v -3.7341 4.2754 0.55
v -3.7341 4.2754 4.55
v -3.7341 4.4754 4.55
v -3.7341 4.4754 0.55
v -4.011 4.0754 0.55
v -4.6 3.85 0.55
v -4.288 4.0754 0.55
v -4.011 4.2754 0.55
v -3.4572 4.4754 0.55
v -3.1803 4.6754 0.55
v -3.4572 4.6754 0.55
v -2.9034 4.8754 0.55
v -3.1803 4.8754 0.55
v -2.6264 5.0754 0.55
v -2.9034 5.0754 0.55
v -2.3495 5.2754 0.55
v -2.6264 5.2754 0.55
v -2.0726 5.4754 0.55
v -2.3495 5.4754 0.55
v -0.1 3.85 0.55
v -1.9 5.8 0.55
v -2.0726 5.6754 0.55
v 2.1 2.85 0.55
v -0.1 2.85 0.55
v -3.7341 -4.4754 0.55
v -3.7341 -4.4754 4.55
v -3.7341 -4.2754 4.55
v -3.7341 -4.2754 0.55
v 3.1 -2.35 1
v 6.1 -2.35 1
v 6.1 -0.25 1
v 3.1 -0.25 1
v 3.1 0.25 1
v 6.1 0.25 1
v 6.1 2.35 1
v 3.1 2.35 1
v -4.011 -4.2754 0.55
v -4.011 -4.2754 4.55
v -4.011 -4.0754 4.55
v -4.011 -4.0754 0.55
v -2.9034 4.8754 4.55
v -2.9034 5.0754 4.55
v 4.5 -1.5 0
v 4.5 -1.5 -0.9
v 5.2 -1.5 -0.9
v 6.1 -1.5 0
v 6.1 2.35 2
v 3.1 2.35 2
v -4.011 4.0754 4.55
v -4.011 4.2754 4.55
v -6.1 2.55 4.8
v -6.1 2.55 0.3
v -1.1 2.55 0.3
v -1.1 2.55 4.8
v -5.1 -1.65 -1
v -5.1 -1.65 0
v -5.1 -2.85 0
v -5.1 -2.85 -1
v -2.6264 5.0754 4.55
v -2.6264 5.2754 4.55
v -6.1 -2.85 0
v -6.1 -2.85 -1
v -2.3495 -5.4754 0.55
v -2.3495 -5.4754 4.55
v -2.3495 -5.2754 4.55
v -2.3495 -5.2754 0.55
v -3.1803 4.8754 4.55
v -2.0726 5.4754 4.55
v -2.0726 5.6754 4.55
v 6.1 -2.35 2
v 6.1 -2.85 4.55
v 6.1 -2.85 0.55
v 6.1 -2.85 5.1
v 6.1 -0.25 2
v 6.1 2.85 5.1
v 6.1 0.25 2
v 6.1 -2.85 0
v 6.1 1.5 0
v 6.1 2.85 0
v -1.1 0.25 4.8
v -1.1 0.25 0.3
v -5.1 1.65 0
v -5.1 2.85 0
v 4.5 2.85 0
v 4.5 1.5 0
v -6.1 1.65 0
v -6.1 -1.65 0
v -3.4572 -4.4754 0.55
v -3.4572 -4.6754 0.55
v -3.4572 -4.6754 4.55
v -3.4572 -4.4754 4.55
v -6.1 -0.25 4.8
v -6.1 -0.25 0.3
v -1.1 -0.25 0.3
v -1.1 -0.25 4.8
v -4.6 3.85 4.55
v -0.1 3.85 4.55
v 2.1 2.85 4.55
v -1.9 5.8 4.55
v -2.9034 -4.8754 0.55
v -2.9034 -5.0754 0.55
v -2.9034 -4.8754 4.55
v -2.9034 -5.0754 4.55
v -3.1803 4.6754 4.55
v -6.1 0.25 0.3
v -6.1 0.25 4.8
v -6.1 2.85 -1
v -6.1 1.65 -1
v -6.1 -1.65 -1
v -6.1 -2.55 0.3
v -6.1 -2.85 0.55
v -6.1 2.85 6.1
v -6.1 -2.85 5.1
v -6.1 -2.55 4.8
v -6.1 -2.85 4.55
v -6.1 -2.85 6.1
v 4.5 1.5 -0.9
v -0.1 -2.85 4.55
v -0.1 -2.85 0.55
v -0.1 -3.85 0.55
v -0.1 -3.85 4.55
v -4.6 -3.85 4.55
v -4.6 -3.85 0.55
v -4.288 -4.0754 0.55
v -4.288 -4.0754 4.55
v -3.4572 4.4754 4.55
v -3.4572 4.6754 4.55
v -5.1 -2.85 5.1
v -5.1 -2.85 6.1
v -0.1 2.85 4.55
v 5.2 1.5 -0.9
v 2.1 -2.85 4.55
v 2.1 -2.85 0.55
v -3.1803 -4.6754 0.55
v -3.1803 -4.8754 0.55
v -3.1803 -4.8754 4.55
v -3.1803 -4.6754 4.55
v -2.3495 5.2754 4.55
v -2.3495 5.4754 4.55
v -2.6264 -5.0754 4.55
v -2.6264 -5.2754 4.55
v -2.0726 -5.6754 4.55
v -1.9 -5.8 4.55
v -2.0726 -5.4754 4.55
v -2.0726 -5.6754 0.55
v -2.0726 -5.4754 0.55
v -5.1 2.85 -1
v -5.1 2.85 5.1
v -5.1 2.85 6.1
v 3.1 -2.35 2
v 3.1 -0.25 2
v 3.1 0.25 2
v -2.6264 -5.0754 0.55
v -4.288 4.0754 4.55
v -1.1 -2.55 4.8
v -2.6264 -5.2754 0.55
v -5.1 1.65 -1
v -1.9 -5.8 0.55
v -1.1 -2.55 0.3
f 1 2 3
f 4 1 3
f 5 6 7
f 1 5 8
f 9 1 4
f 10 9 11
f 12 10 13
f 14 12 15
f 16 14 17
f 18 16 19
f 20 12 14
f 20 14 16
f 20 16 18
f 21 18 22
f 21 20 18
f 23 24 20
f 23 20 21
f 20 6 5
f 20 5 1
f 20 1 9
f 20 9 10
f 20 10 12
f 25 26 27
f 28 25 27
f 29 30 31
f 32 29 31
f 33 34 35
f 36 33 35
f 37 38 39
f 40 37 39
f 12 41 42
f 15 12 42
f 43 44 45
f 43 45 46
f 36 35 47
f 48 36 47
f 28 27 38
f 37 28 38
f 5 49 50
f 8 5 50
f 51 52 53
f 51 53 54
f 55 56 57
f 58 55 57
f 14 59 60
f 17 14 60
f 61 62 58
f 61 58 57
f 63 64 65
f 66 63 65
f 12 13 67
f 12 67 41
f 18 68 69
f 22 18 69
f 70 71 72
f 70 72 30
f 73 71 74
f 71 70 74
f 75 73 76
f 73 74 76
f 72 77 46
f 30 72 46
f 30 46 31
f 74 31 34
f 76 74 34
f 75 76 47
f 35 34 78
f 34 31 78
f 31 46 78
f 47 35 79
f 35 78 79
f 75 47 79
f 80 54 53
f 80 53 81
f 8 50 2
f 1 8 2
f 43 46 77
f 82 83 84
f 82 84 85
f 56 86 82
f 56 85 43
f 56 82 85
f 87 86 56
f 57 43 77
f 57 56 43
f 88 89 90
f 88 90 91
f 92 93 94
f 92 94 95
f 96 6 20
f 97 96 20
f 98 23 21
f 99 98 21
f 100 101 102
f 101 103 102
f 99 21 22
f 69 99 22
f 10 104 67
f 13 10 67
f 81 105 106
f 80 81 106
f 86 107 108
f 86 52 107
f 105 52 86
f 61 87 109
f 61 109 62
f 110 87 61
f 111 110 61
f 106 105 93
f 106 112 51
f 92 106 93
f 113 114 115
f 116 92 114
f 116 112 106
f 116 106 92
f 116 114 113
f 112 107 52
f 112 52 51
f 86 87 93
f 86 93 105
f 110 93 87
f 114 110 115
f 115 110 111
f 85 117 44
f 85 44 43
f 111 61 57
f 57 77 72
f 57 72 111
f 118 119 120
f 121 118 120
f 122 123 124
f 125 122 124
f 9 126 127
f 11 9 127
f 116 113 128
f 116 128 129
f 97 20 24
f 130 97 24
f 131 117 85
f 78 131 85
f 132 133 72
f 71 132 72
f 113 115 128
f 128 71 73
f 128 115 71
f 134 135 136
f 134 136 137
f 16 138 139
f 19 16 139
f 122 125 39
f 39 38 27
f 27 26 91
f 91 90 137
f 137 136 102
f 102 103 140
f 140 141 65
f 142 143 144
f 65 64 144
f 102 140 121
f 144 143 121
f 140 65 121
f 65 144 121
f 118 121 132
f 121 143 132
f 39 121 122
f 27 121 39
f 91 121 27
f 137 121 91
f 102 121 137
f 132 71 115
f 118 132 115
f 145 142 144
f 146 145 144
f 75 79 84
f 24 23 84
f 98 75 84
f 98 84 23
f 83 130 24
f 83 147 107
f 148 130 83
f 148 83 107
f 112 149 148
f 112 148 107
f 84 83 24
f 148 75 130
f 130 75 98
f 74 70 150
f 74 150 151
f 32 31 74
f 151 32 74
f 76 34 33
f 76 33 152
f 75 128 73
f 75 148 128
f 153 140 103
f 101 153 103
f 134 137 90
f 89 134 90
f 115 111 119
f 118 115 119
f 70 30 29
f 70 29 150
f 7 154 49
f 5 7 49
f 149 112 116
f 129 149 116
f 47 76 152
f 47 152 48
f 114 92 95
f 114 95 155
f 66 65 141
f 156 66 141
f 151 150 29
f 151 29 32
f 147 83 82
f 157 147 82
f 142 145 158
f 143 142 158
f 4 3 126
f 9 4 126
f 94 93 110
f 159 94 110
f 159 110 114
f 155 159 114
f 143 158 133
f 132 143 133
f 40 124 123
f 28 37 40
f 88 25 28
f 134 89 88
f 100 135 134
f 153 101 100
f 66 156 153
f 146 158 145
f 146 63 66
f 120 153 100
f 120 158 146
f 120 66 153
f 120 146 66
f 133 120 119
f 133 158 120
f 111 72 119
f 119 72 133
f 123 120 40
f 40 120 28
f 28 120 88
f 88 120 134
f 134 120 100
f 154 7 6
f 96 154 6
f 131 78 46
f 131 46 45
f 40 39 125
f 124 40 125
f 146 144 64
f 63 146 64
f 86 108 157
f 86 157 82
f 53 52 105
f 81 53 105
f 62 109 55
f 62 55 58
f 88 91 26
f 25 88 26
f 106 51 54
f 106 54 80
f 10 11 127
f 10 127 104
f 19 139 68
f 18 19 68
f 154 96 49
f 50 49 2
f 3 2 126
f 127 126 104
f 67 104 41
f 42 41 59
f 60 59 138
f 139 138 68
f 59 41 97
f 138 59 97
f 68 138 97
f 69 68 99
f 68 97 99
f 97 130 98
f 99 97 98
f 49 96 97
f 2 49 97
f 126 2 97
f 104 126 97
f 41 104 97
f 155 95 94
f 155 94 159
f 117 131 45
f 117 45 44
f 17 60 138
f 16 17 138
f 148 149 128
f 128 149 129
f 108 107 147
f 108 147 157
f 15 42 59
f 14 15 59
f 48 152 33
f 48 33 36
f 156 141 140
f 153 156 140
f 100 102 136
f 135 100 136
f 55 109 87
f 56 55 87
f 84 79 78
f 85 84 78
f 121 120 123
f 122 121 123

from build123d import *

# Parameters (mm, degrees)
F1_DEPTH  = 5.1
F2_W      = 3.345763
F2_H      = 0.55
F2_W_2    = 3.297828
F3_DEPTH  = 15
F5_DEPTH  = 25
F6_DEPTH  = 10
F7_W      = 5.7
F7_H      = 1
F7_W_2    = 1.2
F8_DEPTH  = 1
F11_DEPTH = 5.7
F12_W     = 1.586434
F12_H     = 1.404738
F12_W_2   = 1.617856
F12_H_2   = 1.427827
F13_DEPTH = 3
F14_W     = 2.1
F14_H     = 1
F15_DEPTH = 3
F16_W     = 2.3
F16_H     = 4.5
F17_DEPTH = 5


with BuildPart() as f1:
    # F0 (on Top) → F1 (new body)
    with BuildSketch(Plane.XY):
        Polygon((-0.1, 2.85), (-6.1, 2.85), (-6.1, -2.85), (-0.1, -2.85), (-0.1, -3.85), (-4.6, -3.85), (-1.9, -5.8), (2.1, -2.85), (6.1, -2.85), (6.1, 2.85), (2.1, 2.85), (-1.9, 5.8), (-4.6, 3.85), (-0.1, 3.85), align=None)
    extrude(amount=F1_DEPTH)

    # F2 (on face) → F3 (cut)
    with BuildSketch(Plane.YZ.offset(6.1)):
        with Locations((-4.522881, 4.825)):
            Rectangle(F2_W, F2_H)
        with Locations((-4.522881, 0.275)):
            Rectangle(F2_W, F2_H)
        with Locations((4.498914, 4.825)):
            Rectangle(F2_W_2, F2_H)
        with Locations((4.498914, 0.275)):
            Rectangle(F2_W_2, F2_H)
    extrude(amount=-F3_DEPTH, mode=Mode.SUBTRACT)

    # F4 (on face) → F5 (cut)
    with BuildSketch(Plane.XY.offset(4.55)):
        Polygon((-4.011046, 4.075356), (-4.011046, 4.275356), (-4.287969, 4.075356), align=None)
        Polygon((-3.734123, 4.275356), (-3.734123, 4.475356), (-4.011046, 4.275356), align=None)
        Polygon((-3.4572, 4.475356), (-3.4572, 4.675356), (-3.734123, 4.475356), align=None)
        Polygon((-3.180277, 4.675356), (-3.180277, 4.875356), (-3.4572, 4.675356), align=None)
        Polygon((-2.903354, 4.875356), (-2.903354, 5.075356), (-3.180277, 4.875356), align=None)
        Polygon((-2.626431, 5.075356), (-2.626431, 5.275356), (-2.903354, 5.075356), align=None)
        Polygon((-2.349508, 5.275356), (-2.349508, 5.475356), (-2.626431, 5.275356), align=None)
        Polygon((-2.349508, 5.475356), (-2.072585, 5.475356), (-2.072585, 5.675356), align=None)
        Polygon((-3.734123, -4.475356), (-3.4572, -4.675356), (-3.4572, -4.475356), align=None)
        Polygon((-2.072585, -5.475356), (-2.349508, -5.475356), (-2.072585, -5.675356), align=None)
        Polygon((-2.349508, -5.275356), (-2.626431, -5.275356), (-2.349508, -5.475356), align=None)
        Polygon((-2.626431, -5.075356), (-2.903354, -5.075356), (-2.626431, -5.275356), align=None)
        Polygon((-2.903354, -4.875356), (-3.180277, -4.875356), (-2.903354, -5.075356), align=None)
        Polygon((-3.180277, -4.675356), (-3.4572, -4.675356), (-3.180277, -4.875356), align=None)
        Polygon((-4.287969, -4.075356), (-4.011046, -4.275356), (-4.011046, -4.075356), align=None)
        Polygon((-4.011046, -4.275356), (-3.734123, -4.475356), (-3.734123, -4.275356), align=None)
    extrude(amount=-F5_DEPTH, mode=Mode.SUBTRACT)

    # F4 (on face) → F6 (cut)
    with BuildSketch(Plane.XY.offset(4.55)):
        Polygon((-4.011046, 4.075356), (-4.011046, 4.275356), (-4.287969, 4.075356), align=None)
        Polygon((-3.734123, 4.275356), (-3.734123, 4.475356), (-4.011046, 4.275356), align=None)
        Polygon((-3.4572, 4.475356), (-3.4572, 4.675356), (-3.734123, 4.475356), align=None)
        Polygon((-3.180277, 4.675356), (-3.180277, 4.875356), (-3.4572, 4.675356), align=None)
        Polygon((-2.903354, 4.875356), (-2.903354, 5.075356), (-3.180277, 4.875356), align=None)
        Polygon((-2.626431, 5.075356), (-2.626431, 5.275356), (-2.903354, 5.075356), align=None)
        Polygon((-2.349508, 5.275356), (-2.349508, 5.475356), (-2.626431, 5.275356), align=None)
        Polygon((-2.349508, 5.475356), (-2.072585, 5.475356), (-2.072585, 5.675356), align=None)
        Polygon((-3.734123, -4.475356), (-3.4572, -4.675356), (-3.4572, -4.475356), align=None)
        Polygon((-2.072585, -5.475356), (-2.349508, -5.475356), (-2.072585, -5.675356), align=None)
        Polygon((-2.349508, -5.275356), (-2.626431, -5.275356), (-2.349508, -5.475356), align=None)
        Polygon((-2.626431, -5.075356), (-2.903354, -5.075356), (-2.626431, -5.275356), align=None)
        Polygon((-2.903354, -4.875356), (-3.180277, -4.875356), (-2.903354, -5.075356), align=None)
        Polygon((-3.180277, -4.675356), (-3.4572, -4.675356), (-3.180277, -4.875356), align=None)
        Polygon((-4.287969, -4.075356), (-4.011046, -4.275356), (-4.011046, -4.075356), align=None)
        Polygon((-4.011046, -4.275356), (-3.734123, -4.475356), (-3.734123, -4.275356), align=None)
    extrude(amount=-F6_DEPTH, mode=Mode.SUBTRACT)


with BuildPart() as f8:
    # F7 (on face) → F8 (new body)
    with BuildSketch(Plane(origin=(-6.1, 0, 0), x_dir=(0, -1, 0), z_dir=(-1, 0, 0))):
        with Locations((0, 5.6)):
            Rectangle(F7_W, F7_H)
        with Locations((-2.25, -0.5)):
            Rectangle(F7_W_2, F7_H)
        with Locations((2.25, -0.5)):
            Rectangle(F7_W_2, F7_H)
    extrude(amount=-F8_DEPTH)


with BuildPart() as f1_1:
    add(f1.part)

    # F9: union F8
    add(f8.part)

    # F10 (on face) → F11 (join, through all)
    with BuildSketch(Plane(origin=(0, 2.85, 0), x_dir=(-1, 0, 0), z_dir=(0, 1, 0))):
        Polygon((-6.1, 0), (-5.2, -0.9), (-4.5, -0.9), (-4.5, 0), align=None)
    extrude(amount=-F11_DEPTH)

    # F12 (on face) → F13 (cut)
    with BuildSketch(Plane(origin=(4.5, 0, 0), x_dir=(0, -1, 0), z_dir=(-1, 0, 0))):
        with Locations((2.293217, -0.702369)):
            Rectangle(F12_W, F12_H)
        with Locations((-2.308928, -0.713913)):
            Rectangle(F12_W_2, F12_H_2)
    extrude(amount=-F13_DEPTH, mode=Mode.SUBTRACT)

    # F14 (on face) → F15 (cut)
    with BuildSketch(Plane.YZ.offset(6.1)):
        with Locations((-1.3, 1.5)):
            Rectangle(F14_W, F14_H)
        with Locations((1.3, 1.5)):
            Rectangle(F14_W, F14_H)
    extrude(amount=-F15_DEPTH, mode=Mode.SUBTRACT)

    # F16 (on face) → F17 (cut)
    with BuildSketch(Plane(origin=(-6.1, 0, 0), x_dir=(0, -1, 0), z_dir=(-1, 0, 0))):
        with Locations((-1.4, 2.55)):
            Rectangle(F16_W, F16_H)
        with Locations((1.4, 2.55)):
            Rectangle(F16_W, F16_H)
    extrude(amount=-F17_DEPTH, mode=Mode.SUBTRACT)


solid = f1_1.part
